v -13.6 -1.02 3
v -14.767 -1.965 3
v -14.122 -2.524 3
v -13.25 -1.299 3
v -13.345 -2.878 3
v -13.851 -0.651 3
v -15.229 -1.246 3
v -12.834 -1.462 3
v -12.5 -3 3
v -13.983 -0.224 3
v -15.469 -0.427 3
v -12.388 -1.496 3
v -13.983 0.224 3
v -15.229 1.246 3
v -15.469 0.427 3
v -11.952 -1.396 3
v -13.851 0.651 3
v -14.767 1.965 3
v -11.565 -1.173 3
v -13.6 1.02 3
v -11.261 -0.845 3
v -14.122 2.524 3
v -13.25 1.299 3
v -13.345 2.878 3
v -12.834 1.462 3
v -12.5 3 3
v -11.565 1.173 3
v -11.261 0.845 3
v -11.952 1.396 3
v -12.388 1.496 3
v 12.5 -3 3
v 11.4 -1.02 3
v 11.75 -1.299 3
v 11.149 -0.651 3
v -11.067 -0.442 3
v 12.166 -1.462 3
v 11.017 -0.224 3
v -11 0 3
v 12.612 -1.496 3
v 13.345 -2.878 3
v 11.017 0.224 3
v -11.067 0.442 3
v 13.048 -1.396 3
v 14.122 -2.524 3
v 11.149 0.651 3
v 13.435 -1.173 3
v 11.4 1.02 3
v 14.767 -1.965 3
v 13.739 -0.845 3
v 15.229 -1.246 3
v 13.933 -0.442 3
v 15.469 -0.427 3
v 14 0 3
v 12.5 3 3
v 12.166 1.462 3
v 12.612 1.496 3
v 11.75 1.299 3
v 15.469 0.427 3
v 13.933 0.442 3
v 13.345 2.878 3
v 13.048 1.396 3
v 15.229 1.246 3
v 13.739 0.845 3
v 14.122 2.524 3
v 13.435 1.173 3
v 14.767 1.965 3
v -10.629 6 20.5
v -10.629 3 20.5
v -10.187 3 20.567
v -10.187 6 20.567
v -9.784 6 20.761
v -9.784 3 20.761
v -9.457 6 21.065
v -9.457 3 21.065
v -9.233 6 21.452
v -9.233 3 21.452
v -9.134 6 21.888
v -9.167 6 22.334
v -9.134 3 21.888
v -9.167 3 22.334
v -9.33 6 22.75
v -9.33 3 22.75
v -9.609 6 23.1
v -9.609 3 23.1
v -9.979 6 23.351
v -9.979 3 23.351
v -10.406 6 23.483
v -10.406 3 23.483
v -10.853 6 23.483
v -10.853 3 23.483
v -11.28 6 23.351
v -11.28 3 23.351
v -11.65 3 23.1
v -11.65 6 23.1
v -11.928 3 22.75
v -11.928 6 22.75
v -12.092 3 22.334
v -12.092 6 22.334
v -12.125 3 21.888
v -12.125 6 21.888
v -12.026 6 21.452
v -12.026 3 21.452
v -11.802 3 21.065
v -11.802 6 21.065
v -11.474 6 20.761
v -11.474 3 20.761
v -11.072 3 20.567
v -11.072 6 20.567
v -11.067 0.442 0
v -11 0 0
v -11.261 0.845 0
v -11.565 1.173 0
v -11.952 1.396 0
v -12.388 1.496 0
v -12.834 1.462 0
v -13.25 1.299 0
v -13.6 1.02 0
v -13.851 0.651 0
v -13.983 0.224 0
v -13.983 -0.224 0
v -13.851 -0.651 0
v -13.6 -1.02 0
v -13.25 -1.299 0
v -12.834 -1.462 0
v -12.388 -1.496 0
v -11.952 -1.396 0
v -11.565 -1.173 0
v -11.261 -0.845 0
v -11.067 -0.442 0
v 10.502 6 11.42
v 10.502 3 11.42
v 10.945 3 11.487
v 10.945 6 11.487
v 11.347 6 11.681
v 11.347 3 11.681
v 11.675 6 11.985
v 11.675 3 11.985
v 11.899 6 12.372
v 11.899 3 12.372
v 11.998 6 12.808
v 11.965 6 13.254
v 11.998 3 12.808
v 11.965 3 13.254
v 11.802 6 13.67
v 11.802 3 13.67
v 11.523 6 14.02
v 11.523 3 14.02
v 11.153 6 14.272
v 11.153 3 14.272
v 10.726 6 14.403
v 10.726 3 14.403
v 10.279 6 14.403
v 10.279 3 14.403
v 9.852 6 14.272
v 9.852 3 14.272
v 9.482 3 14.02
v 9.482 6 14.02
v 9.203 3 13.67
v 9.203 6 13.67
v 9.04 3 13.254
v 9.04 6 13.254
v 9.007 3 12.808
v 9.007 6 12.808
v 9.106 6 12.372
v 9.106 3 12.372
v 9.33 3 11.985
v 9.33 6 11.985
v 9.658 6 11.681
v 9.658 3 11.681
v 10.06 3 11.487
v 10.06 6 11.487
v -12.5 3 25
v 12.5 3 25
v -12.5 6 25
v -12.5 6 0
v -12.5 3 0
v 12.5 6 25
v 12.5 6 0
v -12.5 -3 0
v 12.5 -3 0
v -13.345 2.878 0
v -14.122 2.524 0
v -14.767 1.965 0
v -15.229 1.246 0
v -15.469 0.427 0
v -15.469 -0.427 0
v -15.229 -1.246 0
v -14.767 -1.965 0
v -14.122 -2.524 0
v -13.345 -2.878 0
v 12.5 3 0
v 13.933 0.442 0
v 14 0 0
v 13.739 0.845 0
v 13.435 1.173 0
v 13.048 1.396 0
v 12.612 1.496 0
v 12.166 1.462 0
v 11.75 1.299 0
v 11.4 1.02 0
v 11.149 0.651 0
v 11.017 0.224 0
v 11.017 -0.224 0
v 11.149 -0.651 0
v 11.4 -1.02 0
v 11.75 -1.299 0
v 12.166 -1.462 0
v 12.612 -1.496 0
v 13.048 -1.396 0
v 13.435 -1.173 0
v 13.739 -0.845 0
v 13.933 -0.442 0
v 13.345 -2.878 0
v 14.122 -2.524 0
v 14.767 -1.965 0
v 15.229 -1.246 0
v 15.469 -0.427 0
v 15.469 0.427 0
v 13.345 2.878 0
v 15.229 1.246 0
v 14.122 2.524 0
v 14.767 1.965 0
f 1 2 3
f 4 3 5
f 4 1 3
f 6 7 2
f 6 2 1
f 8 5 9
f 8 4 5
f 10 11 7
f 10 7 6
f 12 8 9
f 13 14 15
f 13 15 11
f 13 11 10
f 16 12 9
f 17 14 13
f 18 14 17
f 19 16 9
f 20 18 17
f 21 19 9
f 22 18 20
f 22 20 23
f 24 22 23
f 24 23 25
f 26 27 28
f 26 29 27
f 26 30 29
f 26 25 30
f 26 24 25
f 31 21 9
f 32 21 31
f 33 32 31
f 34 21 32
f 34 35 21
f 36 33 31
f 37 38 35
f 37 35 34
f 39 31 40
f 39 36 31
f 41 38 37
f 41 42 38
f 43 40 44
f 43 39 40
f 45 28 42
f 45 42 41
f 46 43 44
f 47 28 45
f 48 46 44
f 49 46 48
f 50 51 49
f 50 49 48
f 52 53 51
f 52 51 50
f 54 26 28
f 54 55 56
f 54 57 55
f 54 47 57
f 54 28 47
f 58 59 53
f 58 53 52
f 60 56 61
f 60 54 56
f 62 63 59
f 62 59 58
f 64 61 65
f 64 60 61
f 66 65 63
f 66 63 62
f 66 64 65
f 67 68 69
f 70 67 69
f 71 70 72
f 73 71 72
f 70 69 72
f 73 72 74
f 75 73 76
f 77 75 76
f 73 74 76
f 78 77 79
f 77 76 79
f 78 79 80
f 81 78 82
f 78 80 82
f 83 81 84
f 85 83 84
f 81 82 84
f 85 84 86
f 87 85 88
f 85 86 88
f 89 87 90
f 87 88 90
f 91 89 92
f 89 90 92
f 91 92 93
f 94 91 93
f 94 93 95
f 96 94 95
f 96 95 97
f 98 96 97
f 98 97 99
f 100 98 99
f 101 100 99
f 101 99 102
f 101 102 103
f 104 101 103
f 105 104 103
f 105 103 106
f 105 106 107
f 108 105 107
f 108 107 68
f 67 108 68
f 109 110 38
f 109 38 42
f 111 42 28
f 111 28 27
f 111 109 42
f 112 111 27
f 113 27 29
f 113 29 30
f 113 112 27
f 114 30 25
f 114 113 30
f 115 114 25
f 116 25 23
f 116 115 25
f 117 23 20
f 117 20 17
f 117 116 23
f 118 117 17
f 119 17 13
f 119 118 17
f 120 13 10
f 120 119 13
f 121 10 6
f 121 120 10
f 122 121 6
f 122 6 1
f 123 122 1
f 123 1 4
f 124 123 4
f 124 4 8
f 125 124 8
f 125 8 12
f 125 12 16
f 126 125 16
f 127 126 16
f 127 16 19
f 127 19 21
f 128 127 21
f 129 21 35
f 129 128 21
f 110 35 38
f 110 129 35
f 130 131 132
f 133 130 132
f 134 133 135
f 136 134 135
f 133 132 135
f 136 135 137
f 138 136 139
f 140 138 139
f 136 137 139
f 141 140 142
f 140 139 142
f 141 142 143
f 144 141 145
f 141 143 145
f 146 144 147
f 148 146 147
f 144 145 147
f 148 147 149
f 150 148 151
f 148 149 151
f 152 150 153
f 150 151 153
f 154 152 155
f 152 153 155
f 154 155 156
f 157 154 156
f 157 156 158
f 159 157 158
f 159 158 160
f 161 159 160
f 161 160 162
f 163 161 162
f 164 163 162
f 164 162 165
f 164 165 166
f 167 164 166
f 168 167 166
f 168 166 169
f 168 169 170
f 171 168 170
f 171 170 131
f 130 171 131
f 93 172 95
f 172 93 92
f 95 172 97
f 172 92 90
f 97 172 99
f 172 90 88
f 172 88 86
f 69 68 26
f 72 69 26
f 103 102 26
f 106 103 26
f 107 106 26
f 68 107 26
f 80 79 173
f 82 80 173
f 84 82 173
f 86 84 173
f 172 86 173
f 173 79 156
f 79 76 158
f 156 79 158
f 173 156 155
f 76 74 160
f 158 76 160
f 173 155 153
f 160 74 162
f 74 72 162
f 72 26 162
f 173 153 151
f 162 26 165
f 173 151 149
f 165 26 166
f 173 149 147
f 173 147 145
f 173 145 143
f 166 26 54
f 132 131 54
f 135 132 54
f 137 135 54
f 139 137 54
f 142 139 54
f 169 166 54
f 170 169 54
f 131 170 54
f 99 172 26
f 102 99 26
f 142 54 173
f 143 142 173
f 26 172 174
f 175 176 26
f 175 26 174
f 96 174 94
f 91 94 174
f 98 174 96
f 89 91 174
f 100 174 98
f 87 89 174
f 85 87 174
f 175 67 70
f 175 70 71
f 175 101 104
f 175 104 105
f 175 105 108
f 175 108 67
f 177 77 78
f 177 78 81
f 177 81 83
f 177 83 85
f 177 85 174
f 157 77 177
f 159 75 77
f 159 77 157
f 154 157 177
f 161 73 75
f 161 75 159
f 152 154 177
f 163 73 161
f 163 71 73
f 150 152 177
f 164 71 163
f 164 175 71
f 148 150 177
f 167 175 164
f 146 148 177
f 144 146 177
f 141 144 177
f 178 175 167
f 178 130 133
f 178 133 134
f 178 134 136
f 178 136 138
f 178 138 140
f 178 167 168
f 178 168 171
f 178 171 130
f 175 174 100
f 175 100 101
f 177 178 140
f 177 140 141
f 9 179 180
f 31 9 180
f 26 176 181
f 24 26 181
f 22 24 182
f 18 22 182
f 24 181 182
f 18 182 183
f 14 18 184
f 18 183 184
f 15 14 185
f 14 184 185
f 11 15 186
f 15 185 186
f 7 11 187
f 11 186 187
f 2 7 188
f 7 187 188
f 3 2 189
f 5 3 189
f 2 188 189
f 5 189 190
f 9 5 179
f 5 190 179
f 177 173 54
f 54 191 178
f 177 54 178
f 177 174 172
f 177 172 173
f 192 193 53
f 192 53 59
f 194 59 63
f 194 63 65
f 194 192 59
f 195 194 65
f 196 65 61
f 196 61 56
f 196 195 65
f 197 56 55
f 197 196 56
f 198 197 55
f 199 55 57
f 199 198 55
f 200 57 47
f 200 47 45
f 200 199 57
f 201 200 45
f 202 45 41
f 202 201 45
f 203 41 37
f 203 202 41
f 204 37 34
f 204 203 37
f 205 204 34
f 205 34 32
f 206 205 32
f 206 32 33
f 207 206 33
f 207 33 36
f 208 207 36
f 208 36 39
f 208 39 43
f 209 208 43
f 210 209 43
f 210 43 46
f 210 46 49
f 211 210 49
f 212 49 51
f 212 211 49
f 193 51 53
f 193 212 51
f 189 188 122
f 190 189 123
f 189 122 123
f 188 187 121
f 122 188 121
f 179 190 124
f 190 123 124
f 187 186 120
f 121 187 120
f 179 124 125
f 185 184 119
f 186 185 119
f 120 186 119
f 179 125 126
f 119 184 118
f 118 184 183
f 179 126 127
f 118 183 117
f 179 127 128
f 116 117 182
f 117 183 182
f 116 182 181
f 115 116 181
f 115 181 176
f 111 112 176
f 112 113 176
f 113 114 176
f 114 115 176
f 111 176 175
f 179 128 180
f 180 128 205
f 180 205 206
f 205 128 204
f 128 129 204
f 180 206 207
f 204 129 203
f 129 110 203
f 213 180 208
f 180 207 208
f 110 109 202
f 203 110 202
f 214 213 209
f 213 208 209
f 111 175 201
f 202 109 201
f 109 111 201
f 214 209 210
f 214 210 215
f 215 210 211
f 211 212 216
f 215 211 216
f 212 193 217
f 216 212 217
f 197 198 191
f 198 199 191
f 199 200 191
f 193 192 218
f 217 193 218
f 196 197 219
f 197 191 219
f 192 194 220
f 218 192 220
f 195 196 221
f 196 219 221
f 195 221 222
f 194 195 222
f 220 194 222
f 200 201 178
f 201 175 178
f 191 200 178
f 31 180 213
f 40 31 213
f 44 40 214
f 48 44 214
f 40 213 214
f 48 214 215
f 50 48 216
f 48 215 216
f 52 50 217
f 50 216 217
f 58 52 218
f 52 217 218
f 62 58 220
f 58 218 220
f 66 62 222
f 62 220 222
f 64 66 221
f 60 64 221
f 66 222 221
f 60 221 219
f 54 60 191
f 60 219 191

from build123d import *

# Parameters (mm, degrees)
SKETCH_1_R          = 1.5
EXTRUDE_1_DEPTH     = 3
EXTRUDE_START       = -3
SKETCH_2_W          = 25
SKETCH_2_H          = 3
EXTRUDE_2_DEPTH     = 25
SKETCH_8_R          = 1.5
CUT_EXTRUDE_1_DEPTH = 31.020826105


with BuildPart() as part:
    # 草图1 → 凸台-拉伸1 (new body)
    with BuildSketch(Plane.XY):
        with BuildLine():
            Line((12.5, 3), (-12.5, 3))
            ThreePointArc((-12.5, 3), (-15.5, 0), (-12.5, -3))
            Line((-12.5, -3), (12.5, -3))
            ThreePointArc((12.5, -3), (15.5, 0), (12.5, 3))
        make_face()
        with Locations((-12.5, 0)):
            Circle(SKETCH_1_R, mode=Mode.SUBTRACT)
        with Locations((12.5, 0)):
            Circle(SKETCH_1_R, mode=Mode.SUBTRACT)
    extrude(amount=EXTRUDE_1_DEPTH)

    # 草图2 → 凸台-拉伸2 (add)
    with BuildSketch(Plane.XY.offset(3).offset(EXTRUDE_START)):
        with Locations((0, 4.5)):
            Rectangle(SKETCH_2_W, SKETCH_2_H)
    extrude(amount=EXTRUDE_2_DEPTH)

    # 草图8 → 切除-拉伸1 (cut, through all)
    with BuildSketch(Plane.XZ.offset(-3)):
        with Locations(Location((-10.629379797, 22, 0), (0, 0, 270))):
            Circle(SKETCH_8_R)
        with Locations(Location((10.50249981, 12.920150648, 0), (0, 0, 270))):
            Circle(SKETCH_8_R)
    extrude(amount=-CUT_EXTRUDE_1_DEPTH, mode=Mode.SUBTRACT)


solid = part.part
